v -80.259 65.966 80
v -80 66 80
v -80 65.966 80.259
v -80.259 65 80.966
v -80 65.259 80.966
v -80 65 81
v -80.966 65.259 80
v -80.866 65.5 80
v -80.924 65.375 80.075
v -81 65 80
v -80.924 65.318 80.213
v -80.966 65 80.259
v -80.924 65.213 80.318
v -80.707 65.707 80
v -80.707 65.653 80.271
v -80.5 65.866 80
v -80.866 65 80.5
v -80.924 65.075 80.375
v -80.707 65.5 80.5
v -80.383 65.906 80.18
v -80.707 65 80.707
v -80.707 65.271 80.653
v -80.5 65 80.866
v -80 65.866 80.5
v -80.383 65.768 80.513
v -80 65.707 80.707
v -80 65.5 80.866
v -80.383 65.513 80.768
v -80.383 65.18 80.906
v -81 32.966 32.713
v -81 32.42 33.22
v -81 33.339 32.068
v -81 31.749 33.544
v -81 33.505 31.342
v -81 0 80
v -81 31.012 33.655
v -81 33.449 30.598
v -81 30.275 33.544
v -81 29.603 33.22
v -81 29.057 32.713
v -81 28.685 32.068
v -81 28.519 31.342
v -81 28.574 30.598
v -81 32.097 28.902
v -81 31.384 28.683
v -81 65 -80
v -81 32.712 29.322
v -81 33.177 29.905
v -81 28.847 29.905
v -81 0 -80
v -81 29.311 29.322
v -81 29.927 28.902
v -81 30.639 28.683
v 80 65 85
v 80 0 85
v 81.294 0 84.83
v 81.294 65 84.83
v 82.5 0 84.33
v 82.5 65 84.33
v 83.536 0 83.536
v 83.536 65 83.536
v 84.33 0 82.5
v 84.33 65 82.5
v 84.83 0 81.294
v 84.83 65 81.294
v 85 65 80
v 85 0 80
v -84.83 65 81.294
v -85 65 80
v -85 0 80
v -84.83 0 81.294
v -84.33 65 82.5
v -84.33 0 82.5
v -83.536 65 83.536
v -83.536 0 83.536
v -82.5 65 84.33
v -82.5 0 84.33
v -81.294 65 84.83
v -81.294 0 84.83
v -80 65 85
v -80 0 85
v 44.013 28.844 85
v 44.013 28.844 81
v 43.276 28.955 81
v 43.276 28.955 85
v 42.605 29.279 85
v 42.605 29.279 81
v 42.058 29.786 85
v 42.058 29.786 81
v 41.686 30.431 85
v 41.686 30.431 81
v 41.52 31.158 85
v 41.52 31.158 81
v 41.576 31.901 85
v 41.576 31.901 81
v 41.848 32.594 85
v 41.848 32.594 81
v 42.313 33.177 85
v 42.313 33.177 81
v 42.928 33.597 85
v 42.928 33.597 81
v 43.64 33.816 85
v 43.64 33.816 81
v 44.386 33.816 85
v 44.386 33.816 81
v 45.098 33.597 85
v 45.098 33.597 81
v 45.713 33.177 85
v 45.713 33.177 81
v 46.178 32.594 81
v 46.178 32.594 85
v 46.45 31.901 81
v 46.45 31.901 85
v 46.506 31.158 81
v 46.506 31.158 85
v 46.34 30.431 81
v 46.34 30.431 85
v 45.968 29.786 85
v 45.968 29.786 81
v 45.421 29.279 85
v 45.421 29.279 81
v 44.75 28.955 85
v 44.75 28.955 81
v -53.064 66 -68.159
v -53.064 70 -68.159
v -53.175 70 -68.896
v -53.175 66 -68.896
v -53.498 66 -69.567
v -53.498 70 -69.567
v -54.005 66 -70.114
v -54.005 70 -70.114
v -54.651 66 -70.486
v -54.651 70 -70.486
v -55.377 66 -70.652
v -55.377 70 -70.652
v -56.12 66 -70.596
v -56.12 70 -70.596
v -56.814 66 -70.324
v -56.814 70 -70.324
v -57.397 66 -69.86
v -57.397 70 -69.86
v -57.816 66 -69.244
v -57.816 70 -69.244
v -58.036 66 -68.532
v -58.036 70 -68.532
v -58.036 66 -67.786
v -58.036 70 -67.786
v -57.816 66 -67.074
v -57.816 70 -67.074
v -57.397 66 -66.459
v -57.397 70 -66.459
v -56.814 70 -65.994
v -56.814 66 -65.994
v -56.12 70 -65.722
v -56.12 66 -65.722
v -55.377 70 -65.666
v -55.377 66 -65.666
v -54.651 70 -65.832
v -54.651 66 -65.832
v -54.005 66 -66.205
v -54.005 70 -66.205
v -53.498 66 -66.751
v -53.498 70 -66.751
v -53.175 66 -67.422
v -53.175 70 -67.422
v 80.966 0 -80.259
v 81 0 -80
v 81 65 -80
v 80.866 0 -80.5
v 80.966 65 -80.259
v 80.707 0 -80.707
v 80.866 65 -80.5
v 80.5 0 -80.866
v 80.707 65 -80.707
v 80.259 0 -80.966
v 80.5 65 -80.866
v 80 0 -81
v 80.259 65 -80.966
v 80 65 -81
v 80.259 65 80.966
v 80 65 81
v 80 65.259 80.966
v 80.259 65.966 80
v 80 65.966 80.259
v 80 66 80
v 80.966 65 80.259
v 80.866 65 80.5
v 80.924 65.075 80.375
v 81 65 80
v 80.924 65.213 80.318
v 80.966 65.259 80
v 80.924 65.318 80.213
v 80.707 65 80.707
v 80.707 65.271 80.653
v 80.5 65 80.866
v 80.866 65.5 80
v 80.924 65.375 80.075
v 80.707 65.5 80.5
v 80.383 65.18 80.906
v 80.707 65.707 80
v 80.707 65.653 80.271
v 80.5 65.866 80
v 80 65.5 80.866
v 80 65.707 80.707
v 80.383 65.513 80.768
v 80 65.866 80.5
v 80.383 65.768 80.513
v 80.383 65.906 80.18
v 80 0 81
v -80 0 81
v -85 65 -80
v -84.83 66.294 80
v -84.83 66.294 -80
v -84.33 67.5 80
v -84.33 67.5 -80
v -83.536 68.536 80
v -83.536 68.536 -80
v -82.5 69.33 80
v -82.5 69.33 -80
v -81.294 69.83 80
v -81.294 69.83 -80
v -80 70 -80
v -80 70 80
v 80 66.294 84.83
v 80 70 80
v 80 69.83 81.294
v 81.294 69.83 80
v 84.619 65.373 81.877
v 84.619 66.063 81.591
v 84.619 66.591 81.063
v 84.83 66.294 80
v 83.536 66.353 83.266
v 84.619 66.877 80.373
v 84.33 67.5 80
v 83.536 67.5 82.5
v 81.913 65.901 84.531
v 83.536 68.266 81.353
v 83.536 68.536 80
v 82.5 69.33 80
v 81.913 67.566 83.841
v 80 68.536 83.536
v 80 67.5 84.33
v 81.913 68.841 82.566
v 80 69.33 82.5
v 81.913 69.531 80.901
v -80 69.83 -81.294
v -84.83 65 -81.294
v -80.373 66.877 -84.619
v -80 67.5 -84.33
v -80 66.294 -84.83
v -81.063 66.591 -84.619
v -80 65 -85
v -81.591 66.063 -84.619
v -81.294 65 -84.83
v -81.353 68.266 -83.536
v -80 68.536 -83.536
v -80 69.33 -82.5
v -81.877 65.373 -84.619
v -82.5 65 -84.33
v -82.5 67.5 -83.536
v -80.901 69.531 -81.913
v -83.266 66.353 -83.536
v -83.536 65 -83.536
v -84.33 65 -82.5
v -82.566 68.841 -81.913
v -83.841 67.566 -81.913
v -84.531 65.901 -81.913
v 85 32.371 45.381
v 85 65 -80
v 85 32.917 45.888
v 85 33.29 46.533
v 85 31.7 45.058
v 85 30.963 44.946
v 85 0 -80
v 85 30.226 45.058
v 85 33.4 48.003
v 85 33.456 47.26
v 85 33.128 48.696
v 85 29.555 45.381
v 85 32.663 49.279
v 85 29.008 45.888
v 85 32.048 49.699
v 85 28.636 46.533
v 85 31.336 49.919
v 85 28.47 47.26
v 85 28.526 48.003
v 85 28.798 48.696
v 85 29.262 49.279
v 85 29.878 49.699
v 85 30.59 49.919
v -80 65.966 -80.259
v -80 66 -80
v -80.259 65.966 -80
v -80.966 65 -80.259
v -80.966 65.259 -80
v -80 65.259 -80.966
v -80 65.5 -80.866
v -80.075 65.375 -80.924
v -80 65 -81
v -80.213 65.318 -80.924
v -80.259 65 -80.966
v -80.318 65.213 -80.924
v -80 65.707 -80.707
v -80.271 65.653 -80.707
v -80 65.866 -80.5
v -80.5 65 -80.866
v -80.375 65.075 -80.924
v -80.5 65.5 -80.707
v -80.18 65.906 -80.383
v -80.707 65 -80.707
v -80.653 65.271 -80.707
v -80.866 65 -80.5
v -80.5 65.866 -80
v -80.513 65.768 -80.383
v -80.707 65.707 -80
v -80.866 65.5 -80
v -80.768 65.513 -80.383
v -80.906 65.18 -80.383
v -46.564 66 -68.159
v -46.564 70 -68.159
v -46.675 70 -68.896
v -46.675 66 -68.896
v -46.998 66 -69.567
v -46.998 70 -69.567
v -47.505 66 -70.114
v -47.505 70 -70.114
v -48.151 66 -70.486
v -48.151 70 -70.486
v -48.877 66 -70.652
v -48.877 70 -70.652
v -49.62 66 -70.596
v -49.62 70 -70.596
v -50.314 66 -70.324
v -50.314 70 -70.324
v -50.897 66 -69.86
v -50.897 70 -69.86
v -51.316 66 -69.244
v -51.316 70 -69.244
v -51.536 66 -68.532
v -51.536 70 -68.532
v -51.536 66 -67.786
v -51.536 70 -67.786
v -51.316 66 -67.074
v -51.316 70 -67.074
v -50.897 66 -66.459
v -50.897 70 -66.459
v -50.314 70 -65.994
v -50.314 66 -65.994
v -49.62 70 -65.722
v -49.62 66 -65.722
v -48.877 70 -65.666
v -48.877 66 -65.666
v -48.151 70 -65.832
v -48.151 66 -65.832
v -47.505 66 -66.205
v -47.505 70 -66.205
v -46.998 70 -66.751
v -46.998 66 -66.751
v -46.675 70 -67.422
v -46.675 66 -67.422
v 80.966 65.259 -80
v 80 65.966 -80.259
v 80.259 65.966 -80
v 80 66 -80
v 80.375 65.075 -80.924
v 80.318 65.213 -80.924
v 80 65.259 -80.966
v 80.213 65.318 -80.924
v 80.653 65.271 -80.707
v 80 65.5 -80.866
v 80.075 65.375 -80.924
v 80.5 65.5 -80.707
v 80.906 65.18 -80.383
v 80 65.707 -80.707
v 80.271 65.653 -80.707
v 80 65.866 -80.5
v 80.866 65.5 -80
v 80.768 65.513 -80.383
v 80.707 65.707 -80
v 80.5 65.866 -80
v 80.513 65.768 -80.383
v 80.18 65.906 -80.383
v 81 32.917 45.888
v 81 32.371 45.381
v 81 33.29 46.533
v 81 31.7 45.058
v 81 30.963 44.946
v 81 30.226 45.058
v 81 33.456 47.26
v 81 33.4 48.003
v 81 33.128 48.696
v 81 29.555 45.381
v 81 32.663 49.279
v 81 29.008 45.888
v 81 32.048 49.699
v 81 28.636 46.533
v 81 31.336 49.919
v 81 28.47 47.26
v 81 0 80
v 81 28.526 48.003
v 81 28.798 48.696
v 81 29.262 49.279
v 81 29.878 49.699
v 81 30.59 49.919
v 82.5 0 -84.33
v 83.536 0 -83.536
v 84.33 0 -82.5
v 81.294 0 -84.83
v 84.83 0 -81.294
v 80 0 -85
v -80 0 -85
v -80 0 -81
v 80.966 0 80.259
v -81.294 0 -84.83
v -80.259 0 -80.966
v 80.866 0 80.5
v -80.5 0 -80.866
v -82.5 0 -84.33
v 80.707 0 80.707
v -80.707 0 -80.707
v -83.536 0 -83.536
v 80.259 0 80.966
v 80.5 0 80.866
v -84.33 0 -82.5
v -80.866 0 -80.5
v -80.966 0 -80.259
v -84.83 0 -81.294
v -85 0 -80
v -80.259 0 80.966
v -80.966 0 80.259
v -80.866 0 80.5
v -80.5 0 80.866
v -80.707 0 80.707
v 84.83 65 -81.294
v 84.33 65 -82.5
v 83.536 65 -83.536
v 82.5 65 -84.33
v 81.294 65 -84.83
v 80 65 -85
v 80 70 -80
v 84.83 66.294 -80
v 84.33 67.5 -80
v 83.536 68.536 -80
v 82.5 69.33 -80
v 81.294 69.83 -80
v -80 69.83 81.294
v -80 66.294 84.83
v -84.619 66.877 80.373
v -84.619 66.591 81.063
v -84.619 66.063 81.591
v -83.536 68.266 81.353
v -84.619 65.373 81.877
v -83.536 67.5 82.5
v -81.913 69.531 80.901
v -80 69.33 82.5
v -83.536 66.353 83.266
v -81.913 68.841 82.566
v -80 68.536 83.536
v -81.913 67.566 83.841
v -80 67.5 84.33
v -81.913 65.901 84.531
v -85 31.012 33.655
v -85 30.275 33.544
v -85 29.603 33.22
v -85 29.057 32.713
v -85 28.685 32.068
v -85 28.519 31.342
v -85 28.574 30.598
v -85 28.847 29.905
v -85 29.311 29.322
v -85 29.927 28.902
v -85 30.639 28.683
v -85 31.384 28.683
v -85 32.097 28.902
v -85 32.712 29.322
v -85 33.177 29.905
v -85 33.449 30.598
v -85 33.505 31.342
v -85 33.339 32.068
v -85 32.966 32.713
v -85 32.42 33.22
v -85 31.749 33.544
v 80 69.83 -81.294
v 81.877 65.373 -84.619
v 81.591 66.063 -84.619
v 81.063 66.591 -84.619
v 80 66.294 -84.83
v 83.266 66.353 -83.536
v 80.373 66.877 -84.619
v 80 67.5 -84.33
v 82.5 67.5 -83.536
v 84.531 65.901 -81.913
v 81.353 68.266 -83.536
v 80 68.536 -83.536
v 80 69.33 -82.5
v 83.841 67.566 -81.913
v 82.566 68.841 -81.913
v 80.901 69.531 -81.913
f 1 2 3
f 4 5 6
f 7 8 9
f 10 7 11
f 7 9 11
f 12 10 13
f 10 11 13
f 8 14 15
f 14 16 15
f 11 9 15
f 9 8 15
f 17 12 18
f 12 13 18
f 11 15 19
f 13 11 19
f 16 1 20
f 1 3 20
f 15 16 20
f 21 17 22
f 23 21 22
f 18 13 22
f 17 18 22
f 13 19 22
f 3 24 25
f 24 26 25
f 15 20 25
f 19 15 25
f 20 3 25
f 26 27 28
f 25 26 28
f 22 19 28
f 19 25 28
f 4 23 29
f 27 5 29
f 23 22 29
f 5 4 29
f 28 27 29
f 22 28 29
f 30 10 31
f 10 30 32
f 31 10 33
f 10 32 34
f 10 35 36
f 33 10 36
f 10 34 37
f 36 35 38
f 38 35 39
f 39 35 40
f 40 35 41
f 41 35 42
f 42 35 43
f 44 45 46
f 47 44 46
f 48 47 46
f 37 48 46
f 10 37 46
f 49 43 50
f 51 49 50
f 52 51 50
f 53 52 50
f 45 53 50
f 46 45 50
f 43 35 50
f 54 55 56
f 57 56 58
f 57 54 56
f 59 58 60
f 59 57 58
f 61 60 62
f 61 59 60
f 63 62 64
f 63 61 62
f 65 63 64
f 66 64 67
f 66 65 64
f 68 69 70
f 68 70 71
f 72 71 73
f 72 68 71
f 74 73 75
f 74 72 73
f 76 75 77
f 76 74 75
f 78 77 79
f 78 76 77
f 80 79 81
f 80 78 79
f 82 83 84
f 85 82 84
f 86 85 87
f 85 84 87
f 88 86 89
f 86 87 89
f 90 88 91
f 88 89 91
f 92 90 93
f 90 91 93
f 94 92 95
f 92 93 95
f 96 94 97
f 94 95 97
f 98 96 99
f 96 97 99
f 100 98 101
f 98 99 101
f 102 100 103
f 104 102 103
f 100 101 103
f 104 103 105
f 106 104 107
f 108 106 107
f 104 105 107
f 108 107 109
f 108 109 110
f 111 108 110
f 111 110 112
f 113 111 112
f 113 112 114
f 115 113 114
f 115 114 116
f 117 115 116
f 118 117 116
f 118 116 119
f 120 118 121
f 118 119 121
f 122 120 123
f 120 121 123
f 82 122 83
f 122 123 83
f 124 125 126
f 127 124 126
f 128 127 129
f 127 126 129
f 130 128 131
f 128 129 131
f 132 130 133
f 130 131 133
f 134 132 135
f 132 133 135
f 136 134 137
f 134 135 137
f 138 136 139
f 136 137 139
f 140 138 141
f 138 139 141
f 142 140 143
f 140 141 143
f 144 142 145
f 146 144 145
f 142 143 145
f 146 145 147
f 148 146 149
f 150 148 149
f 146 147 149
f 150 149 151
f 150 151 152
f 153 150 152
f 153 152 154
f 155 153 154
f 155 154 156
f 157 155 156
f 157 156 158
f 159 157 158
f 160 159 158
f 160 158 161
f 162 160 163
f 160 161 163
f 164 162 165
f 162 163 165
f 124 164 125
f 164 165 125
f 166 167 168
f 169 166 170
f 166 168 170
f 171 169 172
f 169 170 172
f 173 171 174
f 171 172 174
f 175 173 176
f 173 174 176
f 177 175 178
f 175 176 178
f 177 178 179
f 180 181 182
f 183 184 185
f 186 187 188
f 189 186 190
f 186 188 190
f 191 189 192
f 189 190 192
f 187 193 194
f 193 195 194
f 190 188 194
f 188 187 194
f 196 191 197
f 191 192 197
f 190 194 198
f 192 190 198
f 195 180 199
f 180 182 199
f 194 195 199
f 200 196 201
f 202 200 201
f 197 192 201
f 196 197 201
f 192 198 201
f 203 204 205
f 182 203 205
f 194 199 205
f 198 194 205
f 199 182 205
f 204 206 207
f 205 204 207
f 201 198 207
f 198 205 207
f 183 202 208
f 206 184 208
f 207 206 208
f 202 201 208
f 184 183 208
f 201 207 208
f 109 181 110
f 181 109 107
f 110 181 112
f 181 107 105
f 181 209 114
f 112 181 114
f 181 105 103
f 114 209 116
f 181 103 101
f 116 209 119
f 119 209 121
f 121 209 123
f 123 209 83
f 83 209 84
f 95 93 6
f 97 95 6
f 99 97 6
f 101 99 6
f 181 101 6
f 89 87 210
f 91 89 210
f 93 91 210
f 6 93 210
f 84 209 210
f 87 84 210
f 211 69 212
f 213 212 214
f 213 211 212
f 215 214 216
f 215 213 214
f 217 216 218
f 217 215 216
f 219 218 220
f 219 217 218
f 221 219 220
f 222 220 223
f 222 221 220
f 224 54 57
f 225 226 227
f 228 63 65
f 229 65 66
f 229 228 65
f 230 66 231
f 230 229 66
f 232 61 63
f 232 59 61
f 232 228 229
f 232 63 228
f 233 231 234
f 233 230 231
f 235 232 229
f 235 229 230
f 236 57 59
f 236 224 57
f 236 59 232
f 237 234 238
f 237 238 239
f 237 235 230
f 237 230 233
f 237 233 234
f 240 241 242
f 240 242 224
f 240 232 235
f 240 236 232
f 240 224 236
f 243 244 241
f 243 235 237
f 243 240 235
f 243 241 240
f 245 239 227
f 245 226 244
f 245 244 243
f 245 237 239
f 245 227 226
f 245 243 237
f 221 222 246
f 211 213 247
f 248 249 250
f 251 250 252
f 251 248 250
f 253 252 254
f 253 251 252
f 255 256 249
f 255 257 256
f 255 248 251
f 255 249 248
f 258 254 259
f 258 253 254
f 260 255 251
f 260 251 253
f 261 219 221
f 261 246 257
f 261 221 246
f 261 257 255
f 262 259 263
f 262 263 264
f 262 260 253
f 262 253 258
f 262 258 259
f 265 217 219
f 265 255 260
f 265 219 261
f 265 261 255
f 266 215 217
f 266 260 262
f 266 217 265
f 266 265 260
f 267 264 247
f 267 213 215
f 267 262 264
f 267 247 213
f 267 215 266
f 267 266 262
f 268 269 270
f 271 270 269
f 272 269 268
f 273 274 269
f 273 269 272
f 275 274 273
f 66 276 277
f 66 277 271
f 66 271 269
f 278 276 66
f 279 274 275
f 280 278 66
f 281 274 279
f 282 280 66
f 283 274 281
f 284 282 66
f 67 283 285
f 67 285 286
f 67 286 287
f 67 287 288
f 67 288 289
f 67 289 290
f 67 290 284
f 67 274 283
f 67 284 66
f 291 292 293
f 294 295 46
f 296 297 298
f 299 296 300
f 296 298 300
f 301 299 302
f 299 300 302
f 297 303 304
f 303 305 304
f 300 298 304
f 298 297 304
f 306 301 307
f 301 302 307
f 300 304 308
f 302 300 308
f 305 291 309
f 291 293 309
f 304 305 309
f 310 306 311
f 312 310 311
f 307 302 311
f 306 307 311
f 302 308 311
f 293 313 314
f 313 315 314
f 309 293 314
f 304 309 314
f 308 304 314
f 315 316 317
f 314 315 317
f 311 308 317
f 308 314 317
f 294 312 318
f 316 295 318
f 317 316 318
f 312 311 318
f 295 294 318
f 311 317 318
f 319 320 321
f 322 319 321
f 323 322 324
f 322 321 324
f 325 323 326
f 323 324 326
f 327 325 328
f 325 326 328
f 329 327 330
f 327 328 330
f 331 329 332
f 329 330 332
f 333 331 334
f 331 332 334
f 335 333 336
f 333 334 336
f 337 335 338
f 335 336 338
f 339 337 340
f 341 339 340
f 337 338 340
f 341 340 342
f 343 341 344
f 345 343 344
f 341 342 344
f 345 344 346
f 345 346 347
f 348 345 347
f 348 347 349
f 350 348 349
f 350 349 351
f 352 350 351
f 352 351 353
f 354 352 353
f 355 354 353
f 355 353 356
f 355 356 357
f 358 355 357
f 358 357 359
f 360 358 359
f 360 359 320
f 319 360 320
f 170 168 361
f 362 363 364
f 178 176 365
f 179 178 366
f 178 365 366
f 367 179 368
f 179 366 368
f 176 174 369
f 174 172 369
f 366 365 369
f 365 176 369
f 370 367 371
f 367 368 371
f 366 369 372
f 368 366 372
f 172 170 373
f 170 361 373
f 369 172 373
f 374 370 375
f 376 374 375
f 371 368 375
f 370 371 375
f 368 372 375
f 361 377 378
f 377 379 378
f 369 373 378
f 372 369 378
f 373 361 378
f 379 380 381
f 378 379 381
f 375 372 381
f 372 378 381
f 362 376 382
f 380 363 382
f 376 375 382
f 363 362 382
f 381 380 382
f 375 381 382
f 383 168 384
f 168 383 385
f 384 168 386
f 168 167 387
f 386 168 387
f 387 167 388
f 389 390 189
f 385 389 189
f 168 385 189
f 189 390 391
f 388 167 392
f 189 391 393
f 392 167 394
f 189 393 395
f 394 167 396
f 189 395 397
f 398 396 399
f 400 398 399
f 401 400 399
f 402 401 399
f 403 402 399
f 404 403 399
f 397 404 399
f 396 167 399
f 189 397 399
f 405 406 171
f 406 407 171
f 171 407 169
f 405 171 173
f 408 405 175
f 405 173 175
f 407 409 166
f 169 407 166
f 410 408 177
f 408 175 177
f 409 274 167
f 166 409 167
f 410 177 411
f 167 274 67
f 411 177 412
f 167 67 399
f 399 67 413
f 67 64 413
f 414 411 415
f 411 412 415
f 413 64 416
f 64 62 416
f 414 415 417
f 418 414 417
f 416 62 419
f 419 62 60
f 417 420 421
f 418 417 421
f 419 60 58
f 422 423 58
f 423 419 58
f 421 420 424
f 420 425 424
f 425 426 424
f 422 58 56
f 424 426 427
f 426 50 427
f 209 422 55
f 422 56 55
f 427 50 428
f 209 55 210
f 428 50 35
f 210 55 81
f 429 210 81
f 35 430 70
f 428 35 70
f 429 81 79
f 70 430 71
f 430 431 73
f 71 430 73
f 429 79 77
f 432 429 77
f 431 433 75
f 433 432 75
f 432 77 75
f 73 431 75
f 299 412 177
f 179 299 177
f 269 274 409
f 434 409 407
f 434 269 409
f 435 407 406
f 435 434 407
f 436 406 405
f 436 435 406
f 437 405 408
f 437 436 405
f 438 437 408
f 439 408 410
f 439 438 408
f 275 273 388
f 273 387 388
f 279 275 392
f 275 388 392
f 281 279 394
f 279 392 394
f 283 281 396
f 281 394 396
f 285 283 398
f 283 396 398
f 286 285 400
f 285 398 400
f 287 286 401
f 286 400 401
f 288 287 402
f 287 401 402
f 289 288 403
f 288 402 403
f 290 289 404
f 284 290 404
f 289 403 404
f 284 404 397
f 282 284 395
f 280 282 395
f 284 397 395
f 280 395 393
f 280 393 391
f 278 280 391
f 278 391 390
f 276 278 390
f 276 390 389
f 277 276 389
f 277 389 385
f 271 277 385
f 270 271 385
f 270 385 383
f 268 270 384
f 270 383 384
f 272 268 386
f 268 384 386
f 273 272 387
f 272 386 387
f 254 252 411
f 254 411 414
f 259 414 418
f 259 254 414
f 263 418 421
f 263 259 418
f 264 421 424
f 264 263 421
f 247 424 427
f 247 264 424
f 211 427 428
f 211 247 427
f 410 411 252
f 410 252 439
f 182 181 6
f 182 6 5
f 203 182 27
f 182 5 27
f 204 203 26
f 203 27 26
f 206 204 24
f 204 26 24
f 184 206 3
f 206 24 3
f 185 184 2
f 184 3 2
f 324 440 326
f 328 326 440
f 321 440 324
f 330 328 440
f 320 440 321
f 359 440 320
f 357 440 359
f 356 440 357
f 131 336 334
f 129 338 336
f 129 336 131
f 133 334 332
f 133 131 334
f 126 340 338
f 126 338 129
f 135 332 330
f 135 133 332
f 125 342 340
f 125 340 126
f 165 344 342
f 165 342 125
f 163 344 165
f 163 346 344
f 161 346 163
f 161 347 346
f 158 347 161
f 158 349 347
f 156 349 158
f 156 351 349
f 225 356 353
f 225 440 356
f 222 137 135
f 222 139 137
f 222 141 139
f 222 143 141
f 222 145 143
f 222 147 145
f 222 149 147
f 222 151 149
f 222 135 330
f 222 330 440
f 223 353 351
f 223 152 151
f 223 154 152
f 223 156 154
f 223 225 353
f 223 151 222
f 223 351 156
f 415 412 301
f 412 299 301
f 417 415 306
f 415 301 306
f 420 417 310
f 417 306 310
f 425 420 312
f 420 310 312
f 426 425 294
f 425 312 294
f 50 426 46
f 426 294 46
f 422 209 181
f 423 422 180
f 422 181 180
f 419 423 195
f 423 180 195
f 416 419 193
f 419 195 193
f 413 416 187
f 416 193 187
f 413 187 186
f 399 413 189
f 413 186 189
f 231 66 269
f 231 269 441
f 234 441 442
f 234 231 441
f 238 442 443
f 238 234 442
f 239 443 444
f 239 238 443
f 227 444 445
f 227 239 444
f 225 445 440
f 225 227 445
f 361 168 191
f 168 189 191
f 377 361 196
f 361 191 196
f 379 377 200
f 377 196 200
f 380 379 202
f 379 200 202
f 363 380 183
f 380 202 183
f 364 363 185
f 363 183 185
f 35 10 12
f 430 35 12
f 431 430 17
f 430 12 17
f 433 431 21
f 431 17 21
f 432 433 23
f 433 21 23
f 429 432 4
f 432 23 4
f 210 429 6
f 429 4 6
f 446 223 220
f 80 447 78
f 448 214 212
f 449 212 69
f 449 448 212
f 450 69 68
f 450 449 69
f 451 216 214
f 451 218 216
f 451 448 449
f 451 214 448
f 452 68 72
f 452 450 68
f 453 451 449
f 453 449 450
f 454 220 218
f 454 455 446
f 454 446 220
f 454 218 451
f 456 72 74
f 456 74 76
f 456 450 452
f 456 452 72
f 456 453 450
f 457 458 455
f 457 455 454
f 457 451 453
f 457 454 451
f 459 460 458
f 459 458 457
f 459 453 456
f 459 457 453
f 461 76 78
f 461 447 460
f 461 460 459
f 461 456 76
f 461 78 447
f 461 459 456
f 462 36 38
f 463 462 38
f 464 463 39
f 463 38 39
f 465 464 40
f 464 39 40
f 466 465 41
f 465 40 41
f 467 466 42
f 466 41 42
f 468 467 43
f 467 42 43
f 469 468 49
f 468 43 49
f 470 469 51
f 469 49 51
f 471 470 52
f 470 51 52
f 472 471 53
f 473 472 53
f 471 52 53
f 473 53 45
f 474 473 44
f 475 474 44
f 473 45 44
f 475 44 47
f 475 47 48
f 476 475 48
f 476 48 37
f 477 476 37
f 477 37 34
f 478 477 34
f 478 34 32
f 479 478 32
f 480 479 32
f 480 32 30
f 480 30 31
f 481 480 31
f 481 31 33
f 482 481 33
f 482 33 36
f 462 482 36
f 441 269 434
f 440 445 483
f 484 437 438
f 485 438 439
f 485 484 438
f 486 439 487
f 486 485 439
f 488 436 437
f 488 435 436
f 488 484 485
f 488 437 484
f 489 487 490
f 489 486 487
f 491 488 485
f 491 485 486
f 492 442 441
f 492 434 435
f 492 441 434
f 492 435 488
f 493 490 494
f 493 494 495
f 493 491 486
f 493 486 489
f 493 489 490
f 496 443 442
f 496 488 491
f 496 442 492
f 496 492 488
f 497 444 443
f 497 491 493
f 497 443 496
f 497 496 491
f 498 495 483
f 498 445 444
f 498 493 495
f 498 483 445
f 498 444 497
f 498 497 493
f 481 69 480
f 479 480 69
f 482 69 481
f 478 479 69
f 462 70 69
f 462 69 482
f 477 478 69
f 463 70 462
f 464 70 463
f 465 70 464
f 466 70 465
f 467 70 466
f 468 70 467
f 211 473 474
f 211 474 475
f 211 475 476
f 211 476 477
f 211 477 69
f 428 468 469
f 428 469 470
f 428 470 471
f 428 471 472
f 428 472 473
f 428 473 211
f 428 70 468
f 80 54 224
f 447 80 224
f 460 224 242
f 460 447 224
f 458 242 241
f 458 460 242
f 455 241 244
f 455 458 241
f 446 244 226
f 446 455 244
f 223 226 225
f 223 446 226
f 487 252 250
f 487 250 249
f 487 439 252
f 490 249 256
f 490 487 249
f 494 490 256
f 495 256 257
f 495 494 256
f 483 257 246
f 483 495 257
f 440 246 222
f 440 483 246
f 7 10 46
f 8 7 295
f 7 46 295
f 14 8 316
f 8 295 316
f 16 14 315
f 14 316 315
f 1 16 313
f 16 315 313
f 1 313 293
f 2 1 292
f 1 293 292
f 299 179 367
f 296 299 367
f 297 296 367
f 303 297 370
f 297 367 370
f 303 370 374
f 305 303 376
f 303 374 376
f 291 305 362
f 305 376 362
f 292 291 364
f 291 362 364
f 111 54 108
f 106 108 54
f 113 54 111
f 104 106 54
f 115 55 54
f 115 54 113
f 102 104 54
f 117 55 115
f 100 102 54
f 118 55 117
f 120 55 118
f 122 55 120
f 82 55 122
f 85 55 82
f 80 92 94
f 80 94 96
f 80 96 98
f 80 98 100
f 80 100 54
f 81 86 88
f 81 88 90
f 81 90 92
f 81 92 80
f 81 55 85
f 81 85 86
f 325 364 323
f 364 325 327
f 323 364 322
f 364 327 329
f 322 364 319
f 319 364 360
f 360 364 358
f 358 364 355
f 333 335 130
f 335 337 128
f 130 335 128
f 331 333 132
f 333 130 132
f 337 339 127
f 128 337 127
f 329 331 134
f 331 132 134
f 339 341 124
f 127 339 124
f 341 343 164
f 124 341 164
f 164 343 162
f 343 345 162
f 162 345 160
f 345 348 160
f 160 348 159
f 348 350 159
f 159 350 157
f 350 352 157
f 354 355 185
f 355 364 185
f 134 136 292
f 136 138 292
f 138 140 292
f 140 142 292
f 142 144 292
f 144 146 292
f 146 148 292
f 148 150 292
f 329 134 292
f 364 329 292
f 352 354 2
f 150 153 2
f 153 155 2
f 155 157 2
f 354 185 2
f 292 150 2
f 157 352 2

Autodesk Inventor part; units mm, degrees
ref_plane "YZ Plane" through (0, 0, 0) normal (1, 0, 0) x (0, 1, 0)
ref_plane "XZ Plane" through (0, 0, 0) normal (0, 1, 0) x (-1, 0, 0)
ref_plane "XY Plane" through (0, 0, 0) normal (0, 0, 1) x (1, 0, 0)
sketch "Sketch1" plane through (0, 0, 0) normal (0, 1, 0) x (-1, 0, 0)
  line L0 (-85, 85) -> (85, 85)
  line L1 (85, 85) -> (85, -85)
  line L2 (85, -85) -> (-85, -85)
  line L3 (-85, -85) -> (-85, 85)
  line L4 (-85, 85) -> (85, -85) construction
  line L5 (85, 85) -> (-85, -85) construction
  point P0 (0, 0)
  dimension "d0" = 170
  dimension "d1" = 170
extrude "Extrusion1" add sketch "Sketch1" along normal blind 70
fillet "Fillet1" radius 5 8 edges at (0, 70, 85) (85, 70, 0) (-85, 70, 0) (-85, 35, 85) (85, 35, 85) (85, 35, -85) (0, 70, -85) (-85, 35, -85)
shell "Shell1" thickness 4 removed faces 1 at (28.3333, 0, -26.6667)
sketch "Sketch2" plane through (85, 0, 80) normal (1, 0, 0) x (0, 0, -1)
  point P0 (80, 0)
  point P1 (32.5535, 30.9629)
hole "Hole1" at (85, 30.9629, 47.4465) direction (-1, 0, 0) diameter 5 depth 8 tip angle 118
sketch "Sketch3" plane through (-80, 0, 85) normal (0, 0, 1) x (1, 0, 0)
  point P0 (80, 0)
  point P1 (124.013, 31.3444)
hole "Hole2" at (44.013, 31.3444, 85) direction (0, 0, -1) diameter 5 depth 8 tip angle 118
sketch "Sketch4" plane through (-85, 0, -80) normal (-1, 0, 0) x (0, 0, 1)
  point P0 (80, 0)
  point P1 (111.1547, 31.0118)
hole "Hole3" at (-85, 31.0118, 31.1547) direction (1, 0, 0) diameter 5 depth 8 tip angle 118
sketch "Sketch5" plane through (0, 70, 0) normal (0, 1, 0) x (1, 0, 0)
  circle A0 centre (-55.5639, 68.1591) radius 2.5
  circle A1 centre (-49.0639, 68.1591) radius 2.5
  point P0 (0, 0)
  dimension "d27" = 5
  dimension "d28" = 5
  dimension "d29" = 6.5
extrude "Extrusion2" cut sketch "Sketch5" against normal through all
properties part number "PCB_Housing_02"
